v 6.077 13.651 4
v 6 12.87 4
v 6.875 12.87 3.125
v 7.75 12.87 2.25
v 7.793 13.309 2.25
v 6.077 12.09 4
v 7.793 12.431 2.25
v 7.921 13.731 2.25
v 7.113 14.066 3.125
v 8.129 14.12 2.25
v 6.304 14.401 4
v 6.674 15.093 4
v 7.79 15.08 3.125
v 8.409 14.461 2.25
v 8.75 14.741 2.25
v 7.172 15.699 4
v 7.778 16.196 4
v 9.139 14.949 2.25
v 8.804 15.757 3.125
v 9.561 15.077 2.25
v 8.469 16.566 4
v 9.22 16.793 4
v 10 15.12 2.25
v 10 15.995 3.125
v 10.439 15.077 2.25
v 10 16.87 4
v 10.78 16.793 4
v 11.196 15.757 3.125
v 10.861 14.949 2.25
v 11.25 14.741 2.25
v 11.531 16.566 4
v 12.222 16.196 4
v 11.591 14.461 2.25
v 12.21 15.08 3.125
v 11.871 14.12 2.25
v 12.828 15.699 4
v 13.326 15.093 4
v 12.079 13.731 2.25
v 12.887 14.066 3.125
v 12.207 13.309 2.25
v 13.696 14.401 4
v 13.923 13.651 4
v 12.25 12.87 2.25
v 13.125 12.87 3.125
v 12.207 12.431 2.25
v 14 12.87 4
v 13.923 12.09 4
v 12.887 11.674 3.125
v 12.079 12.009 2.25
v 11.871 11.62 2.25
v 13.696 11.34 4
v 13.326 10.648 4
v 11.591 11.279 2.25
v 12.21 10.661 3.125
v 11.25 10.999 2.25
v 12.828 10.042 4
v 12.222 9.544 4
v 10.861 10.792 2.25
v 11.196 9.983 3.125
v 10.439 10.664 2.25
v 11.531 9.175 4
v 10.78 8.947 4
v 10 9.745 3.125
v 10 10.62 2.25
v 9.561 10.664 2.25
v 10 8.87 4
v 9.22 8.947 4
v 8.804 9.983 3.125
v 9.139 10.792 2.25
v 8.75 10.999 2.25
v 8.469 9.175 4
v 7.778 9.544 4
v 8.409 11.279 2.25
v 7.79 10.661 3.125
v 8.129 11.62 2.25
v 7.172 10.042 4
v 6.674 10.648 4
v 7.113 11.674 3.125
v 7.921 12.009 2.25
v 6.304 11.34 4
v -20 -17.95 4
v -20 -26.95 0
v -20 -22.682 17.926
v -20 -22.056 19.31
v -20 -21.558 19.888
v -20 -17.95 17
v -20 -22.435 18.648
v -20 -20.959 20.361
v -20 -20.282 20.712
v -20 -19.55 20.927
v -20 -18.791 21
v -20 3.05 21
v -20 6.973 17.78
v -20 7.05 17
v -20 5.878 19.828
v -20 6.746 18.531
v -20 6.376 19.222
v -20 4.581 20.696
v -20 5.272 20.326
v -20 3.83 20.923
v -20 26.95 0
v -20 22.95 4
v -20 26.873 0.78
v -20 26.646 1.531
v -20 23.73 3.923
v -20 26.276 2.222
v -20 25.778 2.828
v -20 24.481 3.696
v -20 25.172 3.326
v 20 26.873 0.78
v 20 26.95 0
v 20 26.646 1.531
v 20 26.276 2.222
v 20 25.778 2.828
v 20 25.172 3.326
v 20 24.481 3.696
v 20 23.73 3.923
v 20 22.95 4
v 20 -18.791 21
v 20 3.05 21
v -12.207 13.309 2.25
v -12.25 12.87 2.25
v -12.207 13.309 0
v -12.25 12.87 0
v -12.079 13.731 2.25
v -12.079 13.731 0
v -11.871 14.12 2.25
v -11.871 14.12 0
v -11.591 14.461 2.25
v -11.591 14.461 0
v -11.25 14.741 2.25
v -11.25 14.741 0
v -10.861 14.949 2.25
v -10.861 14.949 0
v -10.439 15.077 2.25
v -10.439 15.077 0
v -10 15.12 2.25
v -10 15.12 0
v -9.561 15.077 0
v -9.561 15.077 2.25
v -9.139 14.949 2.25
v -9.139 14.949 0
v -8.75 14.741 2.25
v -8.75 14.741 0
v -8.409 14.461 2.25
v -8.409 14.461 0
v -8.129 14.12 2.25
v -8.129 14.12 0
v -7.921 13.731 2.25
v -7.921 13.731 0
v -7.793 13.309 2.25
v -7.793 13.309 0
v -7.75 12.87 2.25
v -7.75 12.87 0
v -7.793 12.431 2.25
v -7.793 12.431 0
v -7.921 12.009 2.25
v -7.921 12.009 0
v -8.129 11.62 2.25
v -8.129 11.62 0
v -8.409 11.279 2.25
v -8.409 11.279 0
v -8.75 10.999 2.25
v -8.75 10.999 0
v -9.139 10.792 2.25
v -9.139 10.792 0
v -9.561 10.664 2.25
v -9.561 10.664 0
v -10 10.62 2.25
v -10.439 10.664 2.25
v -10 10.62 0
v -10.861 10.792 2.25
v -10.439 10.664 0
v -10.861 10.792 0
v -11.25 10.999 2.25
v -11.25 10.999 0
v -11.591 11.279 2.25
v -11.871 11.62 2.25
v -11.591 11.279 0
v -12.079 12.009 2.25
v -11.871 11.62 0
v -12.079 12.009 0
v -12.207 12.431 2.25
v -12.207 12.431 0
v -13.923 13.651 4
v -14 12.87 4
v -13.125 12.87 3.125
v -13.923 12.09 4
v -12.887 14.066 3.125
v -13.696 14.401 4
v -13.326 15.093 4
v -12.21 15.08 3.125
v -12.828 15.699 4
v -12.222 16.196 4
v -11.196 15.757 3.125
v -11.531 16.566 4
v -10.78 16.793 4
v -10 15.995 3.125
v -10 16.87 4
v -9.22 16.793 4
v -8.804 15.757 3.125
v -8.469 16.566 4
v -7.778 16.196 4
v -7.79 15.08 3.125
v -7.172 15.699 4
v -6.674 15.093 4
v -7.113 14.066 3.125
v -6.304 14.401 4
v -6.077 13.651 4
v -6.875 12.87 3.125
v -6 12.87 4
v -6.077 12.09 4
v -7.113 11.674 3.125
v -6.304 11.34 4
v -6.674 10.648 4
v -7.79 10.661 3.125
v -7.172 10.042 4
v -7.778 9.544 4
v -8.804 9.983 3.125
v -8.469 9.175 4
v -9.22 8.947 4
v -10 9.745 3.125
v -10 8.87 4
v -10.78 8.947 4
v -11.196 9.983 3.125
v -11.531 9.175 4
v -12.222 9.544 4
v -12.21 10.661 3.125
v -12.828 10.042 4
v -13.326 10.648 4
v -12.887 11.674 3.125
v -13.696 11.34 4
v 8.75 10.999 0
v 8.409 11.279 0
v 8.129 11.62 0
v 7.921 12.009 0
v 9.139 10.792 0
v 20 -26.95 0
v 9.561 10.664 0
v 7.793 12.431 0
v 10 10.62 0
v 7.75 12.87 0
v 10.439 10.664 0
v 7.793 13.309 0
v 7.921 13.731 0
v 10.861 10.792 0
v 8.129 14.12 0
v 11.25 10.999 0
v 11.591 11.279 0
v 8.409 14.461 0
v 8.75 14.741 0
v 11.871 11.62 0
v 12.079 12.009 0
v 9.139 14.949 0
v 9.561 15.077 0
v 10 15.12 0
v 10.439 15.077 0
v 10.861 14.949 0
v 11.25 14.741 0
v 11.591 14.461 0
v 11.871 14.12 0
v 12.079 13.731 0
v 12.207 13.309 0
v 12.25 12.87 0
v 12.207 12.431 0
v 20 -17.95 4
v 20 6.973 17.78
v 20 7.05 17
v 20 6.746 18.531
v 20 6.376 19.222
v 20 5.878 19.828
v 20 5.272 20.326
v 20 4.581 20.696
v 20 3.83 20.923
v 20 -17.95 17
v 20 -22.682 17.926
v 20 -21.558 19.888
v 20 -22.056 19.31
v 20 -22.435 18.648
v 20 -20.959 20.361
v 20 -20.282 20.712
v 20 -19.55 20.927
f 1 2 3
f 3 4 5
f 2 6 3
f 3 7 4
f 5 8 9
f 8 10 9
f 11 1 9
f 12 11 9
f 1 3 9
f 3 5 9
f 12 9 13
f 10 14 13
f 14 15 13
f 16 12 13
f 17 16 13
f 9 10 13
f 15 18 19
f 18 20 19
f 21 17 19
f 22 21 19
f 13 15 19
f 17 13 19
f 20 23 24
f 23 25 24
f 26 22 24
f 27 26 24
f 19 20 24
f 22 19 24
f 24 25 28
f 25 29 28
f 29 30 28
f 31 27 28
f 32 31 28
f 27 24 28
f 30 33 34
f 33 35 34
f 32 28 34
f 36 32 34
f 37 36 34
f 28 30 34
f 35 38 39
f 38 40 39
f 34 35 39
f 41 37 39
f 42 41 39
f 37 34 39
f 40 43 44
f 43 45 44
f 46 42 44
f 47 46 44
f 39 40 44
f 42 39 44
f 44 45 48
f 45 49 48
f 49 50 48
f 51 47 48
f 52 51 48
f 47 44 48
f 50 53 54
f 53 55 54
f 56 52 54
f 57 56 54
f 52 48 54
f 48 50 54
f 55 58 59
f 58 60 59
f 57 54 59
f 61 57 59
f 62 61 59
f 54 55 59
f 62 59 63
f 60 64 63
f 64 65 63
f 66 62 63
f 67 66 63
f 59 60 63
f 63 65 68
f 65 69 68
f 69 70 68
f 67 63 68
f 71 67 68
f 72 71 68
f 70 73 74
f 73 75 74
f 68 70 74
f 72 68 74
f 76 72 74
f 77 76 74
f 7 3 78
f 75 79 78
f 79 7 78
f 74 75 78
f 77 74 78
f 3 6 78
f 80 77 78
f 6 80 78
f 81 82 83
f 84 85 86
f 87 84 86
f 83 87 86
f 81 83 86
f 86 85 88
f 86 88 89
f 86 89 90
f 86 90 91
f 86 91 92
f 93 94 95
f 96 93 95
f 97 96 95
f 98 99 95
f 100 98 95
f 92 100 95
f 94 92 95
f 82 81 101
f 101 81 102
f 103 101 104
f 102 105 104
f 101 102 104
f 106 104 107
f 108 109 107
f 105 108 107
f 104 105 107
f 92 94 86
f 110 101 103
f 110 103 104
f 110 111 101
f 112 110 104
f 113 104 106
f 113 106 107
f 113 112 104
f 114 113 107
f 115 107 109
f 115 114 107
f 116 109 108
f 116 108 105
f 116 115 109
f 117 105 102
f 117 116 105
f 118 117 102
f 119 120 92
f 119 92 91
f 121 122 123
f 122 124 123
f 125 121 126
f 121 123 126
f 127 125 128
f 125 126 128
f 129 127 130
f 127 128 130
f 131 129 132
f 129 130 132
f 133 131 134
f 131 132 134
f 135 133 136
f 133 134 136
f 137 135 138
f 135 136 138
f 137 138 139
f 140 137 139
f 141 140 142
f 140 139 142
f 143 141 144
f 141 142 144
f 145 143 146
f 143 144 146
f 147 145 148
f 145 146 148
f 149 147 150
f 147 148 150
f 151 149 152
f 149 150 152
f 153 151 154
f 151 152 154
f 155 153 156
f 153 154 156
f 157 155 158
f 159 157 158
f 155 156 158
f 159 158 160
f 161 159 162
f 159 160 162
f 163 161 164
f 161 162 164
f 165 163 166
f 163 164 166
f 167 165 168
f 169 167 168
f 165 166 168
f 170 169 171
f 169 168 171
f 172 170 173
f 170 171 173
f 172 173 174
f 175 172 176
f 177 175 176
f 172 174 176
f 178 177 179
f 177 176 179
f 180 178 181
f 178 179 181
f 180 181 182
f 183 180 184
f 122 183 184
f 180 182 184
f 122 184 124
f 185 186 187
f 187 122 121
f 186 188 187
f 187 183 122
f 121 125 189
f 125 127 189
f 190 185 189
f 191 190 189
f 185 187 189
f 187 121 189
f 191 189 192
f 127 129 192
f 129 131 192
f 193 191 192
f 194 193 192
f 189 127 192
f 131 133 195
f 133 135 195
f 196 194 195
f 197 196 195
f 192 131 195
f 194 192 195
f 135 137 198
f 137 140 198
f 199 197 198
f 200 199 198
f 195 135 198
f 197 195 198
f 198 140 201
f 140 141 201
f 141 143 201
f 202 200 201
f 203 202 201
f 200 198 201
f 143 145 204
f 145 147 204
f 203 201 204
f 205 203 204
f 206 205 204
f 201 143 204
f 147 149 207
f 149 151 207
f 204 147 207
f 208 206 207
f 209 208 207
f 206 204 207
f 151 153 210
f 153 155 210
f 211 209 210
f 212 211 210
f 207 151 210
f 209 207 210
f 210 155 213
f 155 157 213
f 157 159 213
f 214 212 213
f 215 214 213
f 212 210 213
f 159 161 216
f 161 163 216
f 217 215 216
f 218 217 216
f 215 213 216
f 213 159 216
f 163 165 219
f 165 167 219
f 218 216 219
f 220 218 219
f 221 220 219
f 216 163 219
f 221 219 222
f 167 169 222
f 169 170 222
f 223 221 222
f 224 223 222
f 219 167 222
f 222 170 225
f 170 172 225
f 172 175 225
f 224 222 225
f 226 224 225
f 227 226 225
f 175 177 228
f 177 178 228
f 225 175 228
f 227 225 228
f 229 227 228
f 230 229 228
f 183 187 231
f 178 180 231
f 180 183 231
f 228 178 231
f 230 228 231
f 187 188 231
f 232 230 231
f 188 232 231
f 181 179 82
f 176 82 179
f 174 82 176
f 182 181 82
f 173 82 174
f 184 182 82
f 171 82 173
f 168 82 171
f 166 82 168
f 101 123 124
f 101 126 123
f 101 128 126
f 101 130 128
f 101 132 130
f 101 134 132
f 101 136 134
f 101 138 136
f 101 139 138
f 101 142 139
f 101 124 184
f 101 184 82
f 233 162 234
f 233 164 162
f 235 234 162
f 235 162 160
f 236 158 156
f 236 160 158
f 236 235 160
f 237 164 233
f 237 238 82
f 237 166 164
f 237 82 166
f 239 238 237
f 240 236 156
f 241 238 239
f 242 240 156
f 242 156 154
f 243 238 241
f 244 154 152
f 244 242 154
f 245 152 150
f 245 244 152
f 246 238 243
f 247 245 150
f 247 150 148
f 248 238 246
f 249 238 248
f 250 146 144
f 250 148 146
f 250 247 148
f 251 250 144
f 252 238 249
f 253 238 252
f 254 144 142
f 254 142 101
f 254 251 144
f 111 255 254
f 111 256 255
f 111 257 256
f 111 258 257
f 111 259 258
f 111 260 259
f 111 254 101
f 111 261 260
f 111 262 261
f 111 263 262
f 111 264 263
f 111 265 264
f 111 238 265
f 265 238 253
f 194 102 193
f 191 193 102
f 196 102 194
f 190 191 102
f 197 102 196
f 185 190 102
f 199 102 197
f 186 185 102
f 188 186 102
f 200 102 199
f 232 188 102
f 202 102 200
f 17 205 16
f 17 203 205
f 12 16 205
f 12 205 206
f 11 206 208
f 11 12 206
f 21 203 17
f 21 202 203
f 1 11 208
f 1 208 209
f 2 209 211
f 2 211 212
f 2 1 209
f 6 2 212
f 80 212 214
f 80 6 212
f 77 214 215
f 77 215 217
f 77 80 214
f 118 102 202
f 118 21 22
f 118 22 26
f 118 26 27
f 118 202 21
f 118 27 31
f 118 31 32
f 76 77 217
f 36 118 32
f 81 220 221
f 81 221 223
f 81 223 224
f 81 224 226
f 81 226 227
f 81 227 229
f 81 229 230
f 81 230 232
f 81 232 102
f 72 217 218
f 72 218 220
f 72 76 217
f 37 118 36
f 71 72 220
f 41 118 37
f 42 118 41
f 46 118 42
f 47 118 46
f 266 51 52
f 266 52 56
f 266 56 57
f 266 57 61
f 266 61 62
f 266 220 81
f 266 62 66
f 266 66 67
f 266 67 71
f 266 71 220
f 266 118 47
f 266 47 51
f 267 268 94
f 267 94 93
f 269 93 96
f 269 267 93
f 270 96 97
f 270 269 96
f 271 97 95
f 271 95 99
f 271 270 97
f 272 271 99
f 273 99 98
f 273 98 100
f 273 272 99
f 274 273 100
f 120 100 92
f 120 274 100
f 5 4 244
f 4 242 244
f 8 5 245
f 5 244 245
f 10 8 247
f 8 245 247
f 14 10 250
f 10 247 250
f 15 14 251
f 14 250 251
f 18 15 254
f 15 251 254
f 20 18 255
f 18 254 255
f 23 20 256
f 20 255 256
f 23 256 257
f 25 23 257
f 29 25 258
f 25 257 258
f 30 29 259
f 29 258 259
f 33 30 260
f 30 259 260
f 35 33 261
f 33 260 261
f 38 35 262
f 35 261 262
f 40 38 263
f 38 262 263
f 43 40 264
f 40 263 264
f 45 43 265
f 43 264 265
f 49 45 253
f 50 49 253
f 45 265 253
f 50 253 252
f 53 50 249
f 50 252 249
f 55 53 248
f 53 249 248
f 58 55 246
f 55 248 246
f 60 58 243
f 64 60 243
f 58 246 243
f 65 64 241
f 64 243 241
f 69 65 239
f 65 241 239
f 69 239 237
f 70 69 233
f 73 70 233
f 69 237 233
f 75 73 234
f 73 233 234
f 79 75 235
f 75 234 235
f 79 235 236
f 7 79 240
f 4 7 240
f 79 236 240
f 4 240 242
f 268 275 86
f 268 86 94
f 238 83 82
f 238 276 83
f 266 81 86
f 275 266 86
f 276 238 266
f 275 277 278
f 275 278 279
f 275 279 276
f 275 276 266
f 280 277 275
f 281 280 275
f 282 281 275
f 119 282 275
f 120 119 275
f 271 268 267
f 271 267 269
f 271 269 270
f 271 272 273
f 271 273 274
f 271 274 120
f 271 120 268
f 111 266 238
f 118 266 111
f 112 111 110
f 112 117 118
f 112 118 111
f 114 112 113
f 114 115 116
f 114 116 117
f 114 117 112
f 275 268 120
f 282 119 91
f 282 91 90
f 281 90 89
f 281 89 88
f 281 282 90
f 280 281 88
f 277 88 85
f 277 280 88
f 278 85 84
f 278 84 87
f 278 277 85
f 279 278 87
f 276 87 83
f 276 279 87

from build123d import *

# Parameters (mm, degrees)
F1_DEPTH       = 20
F3_D           = 4.5
F3_CSINK_D     = 8
F3_CSINK_ANGLE = 90


with BuildPart() as f1:
    # F0 (on Right) → F1 (new body, symmetric)
    with BuildSketch(Plane.YZ):
        with BuildLine():
            ThreePointArc((26.95, 0), (25.778427, 2.828427), (22.95, 4))
            Line((22.95, 4), (-17.95, 4))
            Line((-17.95, 4), (-17.95, 17))
            Line((-17.95, 17), (7.05, 17))
            ThreePointArc((7.05, 17), (5.878427, 19.828427), (3.05, 21))
            Line((3.05, 21), (-18.790565, 21))
            ThreePointArc((-18.790565, 21), (-21.269887, 20.138943), (-22.68179, 17.926482))
            Line((-22.68179, 17.926482), (-26.95, 0))
            Line((-26.95, 0), (26.95, 0))
        make_face()
    extrude(amount=F1_DEPTH, both=True)

    # F3 (through all)
    with Locations(Plane.XY.offset(4)):
        with Locations((-10, 12.870283), (10, 12.870283)):
            CounterSinkHole(F3_D / 2, F3_CSINK_D / 2, counter_sink_angle=F3_CSINK_ANGLE)


solid = f1.part
